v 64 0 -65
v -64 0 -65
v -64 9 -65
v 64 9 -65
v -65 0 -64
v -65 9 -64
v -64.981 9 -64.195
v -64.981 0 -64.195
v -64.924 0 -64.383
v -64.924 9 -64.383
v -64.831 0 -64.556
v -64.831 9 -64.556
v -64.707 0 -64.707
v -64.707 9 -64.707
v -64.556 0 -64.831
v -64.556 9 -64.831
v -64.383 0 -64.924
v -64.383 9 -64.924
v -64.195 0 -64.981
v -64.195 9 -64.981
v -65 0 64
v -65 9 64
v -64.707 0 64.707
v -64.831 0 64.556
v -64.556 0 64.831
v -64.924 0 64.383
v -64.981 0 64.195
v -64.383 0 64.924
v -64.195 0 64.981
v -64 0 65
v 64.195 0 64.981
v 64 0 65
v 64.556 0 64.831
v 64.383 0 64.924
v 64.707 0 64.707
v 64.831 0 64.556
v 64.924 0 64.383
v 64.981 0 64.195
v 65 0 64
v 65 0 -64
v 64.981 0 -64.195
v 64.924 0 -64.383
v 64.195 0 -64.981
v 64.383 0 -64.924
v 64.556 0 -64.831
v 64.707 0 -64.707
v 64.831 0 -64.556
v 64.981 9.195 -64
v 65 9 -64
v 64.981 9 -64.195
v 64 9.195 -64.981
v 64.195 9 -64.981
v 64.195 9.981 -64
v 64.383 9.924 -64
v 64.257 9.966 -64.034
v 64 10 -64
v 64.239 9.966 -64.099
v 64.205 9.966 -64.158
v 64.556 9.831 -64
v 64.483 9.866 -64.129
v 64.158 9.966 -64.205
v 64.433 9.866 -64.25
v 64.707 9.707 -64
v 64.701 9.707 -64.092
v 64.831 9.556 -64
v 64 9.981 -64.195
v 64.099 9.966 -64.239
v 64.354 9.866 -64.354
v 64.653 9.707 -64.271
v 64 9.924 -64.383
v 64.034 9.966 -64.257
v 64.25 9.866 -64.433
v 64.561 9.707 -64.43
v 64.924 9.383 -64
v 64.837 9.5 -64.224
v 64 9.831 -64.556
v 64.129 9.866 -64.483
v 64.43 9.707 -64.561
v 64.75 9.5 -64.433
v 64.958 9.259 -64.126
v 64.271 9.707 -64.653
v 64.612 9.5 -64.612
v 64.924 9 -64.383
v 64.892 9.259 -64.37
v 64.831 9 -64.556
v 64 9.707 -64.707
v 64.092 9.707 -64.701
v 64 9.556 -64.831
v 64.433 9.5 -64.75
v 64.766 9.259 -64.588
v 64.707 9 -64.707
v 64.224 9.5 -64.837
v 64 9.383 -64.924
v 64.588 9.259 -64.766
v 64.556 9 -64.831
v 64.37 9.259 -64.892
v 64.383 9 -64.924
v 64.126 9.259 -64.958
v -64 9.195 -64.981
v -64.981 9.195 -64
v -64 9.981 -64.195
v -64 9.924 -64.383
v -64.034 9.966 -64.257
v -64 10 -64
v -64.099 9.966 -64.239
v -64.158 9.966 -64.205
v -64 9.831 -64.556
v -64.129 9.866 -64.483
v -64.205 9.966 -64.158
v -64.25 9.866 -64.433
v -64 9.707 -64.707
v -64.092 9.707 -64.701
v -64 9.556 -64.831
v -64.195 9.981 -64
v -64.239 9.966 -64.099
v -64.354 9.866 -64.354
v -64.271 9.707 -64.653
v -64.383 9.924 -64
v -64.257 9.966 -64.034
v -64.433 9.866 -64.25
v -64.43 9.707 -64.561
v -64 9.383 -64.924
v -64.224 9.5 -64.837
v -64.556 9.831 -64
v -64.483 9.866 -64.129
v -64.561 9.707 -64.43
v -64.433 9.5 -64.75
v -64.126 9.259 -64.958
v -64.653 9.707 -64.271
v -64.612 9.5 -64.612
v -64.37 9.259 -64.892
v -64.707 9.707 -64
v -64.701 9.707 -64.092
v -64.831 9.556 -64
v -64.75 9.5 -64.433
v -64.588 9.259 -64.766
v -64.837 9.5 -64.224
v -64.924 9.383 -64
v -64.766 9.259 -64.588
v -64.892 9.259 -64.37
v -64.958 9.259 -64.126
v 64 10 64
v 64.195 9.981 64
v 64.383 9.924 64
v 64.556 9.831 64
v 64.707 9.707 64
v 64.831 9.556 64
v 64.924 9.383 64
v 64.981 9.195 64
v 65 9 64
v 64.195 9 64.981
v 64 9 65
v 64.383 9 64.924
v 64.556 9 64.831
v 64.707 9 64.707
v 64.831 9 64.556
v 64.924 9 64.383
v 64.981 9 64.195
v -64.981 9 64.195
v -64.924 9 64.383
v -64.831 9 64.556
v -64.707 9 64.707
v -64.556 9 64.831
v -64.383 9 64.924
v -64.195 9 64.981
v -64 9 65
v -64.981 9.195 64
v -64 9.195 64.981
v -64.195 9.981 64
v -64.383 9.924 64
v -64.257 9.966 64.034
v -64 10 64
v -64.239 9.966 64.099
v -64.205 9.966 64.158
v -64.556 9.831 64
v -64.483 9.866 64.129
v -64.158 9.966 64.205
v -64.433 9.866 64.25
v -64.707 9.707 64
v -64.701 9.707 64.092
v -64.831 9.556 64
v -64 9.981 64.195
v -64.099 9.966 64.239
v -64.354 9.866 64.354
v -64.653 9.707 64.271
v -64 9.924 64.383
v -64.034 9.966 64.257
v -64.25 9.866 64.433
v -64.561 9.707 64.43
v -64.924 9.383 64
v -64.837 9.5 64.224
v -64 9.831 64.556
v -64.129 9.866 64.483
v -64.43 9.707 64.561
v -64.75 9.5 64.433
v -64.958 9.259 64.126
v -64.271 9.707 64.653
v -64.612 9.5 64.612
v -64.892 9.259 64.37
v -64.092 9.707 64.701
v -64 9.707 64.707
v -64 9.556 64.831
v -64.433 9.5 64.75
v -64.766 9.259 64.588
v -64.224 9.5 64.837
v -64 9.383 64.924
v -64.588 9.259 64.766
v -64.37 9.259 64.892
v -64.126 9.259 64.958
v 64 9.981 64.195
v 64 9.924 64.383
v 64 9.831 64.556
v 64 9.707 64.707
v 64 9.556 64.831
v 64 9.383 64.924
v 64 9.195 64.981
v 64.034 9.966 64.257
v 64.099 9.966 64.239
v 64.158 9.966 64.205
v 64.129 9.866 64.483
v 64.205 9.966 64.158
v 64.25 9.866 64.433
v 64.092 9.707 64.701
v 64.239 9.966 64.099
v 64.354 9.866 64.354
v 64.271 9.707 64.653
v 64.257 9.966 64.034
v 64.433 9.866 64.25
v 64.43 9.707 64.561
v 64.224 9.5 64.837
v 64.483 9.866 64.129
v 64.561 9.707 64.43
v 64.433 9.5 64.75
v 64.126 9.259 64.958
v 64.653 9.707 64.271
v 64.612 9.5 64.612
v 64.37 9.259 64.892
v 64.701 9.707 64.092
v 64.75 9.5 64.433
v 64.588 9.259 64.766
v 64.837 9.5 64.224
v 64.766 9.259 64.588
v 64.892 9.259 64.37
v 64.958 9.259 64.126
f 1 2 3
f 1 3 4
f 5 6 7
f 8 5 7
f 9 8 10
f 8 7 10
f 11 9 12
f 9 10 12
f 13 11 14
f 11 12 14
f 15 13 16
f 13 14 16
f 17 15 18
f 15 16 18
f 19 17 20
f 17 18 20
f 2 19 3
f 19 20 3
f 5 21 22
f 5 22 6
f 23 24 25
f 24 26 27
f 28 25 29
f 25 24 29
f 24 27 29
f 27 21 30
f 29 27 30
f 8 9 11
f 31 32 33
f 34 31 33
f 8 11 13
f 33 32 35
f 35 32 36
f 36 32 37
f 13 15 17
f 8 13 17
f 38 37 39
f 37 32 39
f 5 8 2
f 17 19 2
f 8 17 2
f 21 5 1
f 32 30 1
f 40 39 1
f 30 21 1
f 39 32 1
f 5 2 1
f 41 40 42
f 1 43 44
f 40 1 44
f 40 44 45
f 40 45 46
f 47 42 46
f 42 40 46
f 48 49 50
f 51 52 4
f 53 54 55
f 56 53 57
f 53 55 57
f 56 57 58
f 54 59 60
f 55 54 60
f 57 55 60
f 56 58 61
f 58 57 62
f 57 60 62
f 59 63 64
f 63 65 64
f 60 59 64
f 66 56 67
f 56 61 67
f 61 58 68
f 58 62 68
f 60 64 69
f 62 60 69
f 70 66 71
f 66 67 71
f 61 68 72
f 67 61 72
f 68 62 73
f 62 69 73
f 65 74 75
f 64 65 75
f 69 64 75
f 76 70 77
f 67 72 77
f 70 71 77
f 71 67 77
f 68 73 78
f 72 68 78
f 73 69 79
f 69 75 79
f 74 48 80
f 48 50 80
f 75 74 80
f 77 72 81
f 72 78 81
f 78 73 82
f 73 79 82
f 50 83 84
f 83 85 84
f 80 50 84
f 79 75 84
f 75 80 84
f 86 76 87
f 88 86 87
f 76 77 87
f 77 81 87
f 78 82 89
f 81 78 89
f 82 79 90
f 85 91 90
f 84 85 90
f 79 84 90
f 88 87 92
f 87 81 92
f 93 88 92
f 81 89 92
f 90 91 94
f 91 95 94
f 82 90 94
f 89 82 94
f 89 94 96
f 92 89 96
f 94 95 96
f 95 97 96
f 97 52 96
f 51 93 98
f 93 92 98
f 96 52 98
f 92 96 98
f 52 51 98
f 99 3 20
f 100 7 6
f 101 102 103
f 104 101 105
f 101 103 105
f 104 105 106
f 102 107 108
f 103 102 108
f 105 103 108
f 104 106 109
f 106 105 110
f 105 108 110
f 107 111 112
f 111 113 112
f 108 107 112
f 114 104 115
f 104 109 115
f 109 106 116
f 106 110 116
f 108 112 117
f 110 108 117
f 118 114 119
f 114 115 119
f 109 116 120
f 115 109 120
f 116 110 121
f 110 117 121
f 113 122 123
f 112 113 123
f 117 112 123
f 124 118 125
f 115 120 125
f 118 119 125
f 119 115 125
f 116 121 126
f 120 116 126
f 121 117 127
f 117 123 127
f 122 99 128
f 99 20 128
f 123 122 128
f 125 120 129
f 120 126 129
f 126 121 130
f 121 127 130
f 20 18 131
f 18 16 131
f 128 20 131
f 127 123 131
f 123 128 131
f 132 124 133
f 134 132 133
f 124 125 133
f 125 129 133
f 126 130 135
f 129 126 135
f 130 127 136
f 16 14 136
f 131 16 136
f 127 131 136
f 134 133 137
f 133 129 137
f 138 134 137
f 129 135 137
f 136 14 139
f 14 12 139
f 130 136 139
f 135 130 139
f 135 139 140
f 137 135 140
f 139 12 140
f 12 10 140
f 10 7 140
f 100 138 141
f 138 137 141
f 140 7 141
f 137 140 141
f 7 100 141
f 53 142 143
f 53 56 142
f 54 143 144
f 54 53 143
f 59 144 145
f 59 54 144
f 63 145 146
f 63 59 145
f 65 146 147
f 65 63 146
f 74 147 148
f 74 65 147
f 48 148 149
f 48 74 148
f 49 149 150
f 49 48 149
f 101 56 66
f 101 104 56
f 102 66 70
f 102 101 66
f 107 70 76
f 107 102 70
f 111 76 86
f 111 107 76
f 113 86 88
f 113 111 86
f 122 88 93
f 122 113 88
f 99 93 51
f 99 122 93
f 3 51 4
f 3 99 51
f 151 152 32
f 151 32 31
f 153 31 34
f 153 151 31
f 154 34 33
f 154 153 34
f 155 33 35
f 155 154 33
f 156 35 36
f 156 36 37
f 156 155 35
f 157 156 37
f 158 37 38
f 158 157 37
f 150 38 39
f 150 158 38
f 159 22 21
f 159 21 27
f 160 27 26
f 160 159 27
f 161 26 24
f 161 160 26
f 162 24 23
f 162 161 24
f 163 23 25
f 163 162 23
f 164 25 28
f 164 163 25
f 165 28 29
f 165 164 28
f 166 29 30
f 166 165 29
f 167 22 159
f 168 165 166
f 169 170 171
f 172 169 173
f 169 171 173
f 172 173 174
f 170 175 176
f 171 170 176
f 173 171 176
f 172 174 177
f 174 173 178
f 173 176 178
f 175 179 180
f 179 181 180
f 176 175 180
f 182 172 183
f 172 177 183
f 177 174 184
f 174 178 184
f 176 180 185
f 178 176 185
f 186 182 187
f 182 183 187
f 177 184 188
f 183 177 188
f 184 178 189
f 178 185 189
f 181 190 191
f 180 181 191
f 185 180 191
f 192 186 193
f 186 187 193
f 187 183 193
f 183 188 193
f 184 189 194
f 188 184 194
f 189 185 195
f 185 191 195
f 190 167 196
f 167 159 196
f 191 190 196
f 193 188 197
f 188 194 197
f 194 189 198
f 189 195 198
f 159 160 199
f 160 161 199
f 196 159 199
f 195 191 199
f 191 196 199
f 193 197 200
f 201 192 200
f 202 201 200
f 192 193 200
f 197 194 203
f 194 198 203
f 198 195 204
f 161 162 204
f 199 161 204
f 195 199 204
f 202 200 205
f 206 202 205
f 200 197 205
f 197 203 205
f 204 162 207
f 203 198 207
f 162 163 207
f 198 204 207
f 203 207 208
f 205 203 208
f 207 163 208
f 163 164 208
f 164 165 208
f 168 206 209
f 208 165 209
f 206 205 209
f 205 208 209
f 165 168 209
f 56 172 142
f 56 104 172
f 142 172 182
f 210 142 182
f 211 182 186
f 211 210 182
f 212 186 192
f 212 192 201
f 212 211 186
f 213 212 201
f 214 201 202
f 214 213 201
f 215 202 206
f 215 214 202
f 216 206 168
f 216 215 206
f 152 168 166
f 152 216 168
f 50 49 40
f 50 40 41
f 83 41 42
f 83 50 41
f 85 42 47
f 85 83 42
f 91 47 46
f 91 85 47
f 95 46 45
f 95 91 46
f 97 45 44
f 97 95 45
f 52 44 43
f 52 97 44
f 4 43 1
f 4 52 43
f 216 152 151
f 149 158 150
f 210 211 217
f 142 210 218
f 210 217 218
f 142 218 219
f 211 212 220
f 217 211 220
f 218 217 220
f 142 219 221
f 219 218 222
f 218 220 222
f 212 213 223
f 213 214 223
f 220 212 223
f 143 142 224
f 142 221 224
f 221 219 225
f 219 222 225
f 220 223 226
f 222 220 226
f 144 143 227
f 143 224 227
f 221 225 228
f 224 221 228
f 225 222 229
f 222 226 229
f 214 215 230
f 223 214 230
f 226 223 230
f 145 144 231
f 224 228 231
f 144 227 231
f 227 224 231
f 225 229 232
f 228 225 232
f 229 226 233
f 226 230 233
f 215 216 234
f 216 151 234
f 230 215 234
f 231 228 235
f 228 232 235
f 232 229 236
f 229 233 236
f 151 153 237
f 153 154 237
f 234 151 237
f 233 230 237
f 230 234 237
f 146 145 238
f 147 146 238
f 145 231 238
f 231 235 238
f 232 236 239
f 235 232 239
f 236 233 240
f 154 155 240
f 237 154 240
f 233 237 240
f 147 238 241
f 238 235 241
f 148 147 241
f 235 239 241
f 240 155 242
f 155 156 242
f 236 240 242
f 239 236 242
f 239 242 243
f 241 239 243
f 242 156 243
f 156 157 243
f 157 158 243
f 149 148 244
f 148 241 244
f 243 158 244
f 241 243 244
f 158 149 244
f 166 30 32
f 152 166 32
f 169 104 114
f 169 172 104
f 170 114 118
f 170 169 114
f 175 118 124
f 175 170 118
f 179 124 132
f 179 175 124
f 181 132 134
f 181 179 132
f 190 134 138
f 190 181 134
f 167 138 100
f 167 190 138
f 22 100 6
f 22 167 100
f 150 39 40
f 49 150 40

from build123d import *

# Parameters (mm, degrees)
SKETCH1_W           = 130
SKETCH1_H           = 130
BOSS_EXTRUDE1_DEPTH = 10
FILLET1_R           = 1
FILLET2_R           = 1


with BuildPart() as part:
    # Sketch1 → Boss-Extrude1 (new body)
    with BuildSketch(Plane(origin=(0, 0, 0), x_dir=(1, 0, 0), z_dir=(0, 1, 0))):
        Rectangle(SKETCH1_W, SKETCH1_H)
    extrude(amount=BOSS_EXTRUDE1_DEPTH)

    # Fillet1
    fillet1_edges = [part.edges().sort_by_distance(p)[0] for p in [
        (65, 5, 65),
        (-65, 5, 65),
        (-65, 5, -65),
        (65, 5, -65),
    ]]
    fillet(fillet1_edges, radius=FILLET1_R)

    # Fillet2
    fillet2_edges = [part.edges().sort_by_distance(p)[0] for p in [
        (0, 10, 65),
        (-65, 10, 0),
        (65, 10, 0),
        (0, 10, -65),
        (-64.707106781, 10, -64.707106781),
        (64.707106781, 10, -64.707106781),
        (64.707106781, 10, 64.707106781),
        (-64.707106781, 10, 64.707106781),
    ]]
    fillet(fillet2_edges, radius=FILLET2_R)


solid = part.part
